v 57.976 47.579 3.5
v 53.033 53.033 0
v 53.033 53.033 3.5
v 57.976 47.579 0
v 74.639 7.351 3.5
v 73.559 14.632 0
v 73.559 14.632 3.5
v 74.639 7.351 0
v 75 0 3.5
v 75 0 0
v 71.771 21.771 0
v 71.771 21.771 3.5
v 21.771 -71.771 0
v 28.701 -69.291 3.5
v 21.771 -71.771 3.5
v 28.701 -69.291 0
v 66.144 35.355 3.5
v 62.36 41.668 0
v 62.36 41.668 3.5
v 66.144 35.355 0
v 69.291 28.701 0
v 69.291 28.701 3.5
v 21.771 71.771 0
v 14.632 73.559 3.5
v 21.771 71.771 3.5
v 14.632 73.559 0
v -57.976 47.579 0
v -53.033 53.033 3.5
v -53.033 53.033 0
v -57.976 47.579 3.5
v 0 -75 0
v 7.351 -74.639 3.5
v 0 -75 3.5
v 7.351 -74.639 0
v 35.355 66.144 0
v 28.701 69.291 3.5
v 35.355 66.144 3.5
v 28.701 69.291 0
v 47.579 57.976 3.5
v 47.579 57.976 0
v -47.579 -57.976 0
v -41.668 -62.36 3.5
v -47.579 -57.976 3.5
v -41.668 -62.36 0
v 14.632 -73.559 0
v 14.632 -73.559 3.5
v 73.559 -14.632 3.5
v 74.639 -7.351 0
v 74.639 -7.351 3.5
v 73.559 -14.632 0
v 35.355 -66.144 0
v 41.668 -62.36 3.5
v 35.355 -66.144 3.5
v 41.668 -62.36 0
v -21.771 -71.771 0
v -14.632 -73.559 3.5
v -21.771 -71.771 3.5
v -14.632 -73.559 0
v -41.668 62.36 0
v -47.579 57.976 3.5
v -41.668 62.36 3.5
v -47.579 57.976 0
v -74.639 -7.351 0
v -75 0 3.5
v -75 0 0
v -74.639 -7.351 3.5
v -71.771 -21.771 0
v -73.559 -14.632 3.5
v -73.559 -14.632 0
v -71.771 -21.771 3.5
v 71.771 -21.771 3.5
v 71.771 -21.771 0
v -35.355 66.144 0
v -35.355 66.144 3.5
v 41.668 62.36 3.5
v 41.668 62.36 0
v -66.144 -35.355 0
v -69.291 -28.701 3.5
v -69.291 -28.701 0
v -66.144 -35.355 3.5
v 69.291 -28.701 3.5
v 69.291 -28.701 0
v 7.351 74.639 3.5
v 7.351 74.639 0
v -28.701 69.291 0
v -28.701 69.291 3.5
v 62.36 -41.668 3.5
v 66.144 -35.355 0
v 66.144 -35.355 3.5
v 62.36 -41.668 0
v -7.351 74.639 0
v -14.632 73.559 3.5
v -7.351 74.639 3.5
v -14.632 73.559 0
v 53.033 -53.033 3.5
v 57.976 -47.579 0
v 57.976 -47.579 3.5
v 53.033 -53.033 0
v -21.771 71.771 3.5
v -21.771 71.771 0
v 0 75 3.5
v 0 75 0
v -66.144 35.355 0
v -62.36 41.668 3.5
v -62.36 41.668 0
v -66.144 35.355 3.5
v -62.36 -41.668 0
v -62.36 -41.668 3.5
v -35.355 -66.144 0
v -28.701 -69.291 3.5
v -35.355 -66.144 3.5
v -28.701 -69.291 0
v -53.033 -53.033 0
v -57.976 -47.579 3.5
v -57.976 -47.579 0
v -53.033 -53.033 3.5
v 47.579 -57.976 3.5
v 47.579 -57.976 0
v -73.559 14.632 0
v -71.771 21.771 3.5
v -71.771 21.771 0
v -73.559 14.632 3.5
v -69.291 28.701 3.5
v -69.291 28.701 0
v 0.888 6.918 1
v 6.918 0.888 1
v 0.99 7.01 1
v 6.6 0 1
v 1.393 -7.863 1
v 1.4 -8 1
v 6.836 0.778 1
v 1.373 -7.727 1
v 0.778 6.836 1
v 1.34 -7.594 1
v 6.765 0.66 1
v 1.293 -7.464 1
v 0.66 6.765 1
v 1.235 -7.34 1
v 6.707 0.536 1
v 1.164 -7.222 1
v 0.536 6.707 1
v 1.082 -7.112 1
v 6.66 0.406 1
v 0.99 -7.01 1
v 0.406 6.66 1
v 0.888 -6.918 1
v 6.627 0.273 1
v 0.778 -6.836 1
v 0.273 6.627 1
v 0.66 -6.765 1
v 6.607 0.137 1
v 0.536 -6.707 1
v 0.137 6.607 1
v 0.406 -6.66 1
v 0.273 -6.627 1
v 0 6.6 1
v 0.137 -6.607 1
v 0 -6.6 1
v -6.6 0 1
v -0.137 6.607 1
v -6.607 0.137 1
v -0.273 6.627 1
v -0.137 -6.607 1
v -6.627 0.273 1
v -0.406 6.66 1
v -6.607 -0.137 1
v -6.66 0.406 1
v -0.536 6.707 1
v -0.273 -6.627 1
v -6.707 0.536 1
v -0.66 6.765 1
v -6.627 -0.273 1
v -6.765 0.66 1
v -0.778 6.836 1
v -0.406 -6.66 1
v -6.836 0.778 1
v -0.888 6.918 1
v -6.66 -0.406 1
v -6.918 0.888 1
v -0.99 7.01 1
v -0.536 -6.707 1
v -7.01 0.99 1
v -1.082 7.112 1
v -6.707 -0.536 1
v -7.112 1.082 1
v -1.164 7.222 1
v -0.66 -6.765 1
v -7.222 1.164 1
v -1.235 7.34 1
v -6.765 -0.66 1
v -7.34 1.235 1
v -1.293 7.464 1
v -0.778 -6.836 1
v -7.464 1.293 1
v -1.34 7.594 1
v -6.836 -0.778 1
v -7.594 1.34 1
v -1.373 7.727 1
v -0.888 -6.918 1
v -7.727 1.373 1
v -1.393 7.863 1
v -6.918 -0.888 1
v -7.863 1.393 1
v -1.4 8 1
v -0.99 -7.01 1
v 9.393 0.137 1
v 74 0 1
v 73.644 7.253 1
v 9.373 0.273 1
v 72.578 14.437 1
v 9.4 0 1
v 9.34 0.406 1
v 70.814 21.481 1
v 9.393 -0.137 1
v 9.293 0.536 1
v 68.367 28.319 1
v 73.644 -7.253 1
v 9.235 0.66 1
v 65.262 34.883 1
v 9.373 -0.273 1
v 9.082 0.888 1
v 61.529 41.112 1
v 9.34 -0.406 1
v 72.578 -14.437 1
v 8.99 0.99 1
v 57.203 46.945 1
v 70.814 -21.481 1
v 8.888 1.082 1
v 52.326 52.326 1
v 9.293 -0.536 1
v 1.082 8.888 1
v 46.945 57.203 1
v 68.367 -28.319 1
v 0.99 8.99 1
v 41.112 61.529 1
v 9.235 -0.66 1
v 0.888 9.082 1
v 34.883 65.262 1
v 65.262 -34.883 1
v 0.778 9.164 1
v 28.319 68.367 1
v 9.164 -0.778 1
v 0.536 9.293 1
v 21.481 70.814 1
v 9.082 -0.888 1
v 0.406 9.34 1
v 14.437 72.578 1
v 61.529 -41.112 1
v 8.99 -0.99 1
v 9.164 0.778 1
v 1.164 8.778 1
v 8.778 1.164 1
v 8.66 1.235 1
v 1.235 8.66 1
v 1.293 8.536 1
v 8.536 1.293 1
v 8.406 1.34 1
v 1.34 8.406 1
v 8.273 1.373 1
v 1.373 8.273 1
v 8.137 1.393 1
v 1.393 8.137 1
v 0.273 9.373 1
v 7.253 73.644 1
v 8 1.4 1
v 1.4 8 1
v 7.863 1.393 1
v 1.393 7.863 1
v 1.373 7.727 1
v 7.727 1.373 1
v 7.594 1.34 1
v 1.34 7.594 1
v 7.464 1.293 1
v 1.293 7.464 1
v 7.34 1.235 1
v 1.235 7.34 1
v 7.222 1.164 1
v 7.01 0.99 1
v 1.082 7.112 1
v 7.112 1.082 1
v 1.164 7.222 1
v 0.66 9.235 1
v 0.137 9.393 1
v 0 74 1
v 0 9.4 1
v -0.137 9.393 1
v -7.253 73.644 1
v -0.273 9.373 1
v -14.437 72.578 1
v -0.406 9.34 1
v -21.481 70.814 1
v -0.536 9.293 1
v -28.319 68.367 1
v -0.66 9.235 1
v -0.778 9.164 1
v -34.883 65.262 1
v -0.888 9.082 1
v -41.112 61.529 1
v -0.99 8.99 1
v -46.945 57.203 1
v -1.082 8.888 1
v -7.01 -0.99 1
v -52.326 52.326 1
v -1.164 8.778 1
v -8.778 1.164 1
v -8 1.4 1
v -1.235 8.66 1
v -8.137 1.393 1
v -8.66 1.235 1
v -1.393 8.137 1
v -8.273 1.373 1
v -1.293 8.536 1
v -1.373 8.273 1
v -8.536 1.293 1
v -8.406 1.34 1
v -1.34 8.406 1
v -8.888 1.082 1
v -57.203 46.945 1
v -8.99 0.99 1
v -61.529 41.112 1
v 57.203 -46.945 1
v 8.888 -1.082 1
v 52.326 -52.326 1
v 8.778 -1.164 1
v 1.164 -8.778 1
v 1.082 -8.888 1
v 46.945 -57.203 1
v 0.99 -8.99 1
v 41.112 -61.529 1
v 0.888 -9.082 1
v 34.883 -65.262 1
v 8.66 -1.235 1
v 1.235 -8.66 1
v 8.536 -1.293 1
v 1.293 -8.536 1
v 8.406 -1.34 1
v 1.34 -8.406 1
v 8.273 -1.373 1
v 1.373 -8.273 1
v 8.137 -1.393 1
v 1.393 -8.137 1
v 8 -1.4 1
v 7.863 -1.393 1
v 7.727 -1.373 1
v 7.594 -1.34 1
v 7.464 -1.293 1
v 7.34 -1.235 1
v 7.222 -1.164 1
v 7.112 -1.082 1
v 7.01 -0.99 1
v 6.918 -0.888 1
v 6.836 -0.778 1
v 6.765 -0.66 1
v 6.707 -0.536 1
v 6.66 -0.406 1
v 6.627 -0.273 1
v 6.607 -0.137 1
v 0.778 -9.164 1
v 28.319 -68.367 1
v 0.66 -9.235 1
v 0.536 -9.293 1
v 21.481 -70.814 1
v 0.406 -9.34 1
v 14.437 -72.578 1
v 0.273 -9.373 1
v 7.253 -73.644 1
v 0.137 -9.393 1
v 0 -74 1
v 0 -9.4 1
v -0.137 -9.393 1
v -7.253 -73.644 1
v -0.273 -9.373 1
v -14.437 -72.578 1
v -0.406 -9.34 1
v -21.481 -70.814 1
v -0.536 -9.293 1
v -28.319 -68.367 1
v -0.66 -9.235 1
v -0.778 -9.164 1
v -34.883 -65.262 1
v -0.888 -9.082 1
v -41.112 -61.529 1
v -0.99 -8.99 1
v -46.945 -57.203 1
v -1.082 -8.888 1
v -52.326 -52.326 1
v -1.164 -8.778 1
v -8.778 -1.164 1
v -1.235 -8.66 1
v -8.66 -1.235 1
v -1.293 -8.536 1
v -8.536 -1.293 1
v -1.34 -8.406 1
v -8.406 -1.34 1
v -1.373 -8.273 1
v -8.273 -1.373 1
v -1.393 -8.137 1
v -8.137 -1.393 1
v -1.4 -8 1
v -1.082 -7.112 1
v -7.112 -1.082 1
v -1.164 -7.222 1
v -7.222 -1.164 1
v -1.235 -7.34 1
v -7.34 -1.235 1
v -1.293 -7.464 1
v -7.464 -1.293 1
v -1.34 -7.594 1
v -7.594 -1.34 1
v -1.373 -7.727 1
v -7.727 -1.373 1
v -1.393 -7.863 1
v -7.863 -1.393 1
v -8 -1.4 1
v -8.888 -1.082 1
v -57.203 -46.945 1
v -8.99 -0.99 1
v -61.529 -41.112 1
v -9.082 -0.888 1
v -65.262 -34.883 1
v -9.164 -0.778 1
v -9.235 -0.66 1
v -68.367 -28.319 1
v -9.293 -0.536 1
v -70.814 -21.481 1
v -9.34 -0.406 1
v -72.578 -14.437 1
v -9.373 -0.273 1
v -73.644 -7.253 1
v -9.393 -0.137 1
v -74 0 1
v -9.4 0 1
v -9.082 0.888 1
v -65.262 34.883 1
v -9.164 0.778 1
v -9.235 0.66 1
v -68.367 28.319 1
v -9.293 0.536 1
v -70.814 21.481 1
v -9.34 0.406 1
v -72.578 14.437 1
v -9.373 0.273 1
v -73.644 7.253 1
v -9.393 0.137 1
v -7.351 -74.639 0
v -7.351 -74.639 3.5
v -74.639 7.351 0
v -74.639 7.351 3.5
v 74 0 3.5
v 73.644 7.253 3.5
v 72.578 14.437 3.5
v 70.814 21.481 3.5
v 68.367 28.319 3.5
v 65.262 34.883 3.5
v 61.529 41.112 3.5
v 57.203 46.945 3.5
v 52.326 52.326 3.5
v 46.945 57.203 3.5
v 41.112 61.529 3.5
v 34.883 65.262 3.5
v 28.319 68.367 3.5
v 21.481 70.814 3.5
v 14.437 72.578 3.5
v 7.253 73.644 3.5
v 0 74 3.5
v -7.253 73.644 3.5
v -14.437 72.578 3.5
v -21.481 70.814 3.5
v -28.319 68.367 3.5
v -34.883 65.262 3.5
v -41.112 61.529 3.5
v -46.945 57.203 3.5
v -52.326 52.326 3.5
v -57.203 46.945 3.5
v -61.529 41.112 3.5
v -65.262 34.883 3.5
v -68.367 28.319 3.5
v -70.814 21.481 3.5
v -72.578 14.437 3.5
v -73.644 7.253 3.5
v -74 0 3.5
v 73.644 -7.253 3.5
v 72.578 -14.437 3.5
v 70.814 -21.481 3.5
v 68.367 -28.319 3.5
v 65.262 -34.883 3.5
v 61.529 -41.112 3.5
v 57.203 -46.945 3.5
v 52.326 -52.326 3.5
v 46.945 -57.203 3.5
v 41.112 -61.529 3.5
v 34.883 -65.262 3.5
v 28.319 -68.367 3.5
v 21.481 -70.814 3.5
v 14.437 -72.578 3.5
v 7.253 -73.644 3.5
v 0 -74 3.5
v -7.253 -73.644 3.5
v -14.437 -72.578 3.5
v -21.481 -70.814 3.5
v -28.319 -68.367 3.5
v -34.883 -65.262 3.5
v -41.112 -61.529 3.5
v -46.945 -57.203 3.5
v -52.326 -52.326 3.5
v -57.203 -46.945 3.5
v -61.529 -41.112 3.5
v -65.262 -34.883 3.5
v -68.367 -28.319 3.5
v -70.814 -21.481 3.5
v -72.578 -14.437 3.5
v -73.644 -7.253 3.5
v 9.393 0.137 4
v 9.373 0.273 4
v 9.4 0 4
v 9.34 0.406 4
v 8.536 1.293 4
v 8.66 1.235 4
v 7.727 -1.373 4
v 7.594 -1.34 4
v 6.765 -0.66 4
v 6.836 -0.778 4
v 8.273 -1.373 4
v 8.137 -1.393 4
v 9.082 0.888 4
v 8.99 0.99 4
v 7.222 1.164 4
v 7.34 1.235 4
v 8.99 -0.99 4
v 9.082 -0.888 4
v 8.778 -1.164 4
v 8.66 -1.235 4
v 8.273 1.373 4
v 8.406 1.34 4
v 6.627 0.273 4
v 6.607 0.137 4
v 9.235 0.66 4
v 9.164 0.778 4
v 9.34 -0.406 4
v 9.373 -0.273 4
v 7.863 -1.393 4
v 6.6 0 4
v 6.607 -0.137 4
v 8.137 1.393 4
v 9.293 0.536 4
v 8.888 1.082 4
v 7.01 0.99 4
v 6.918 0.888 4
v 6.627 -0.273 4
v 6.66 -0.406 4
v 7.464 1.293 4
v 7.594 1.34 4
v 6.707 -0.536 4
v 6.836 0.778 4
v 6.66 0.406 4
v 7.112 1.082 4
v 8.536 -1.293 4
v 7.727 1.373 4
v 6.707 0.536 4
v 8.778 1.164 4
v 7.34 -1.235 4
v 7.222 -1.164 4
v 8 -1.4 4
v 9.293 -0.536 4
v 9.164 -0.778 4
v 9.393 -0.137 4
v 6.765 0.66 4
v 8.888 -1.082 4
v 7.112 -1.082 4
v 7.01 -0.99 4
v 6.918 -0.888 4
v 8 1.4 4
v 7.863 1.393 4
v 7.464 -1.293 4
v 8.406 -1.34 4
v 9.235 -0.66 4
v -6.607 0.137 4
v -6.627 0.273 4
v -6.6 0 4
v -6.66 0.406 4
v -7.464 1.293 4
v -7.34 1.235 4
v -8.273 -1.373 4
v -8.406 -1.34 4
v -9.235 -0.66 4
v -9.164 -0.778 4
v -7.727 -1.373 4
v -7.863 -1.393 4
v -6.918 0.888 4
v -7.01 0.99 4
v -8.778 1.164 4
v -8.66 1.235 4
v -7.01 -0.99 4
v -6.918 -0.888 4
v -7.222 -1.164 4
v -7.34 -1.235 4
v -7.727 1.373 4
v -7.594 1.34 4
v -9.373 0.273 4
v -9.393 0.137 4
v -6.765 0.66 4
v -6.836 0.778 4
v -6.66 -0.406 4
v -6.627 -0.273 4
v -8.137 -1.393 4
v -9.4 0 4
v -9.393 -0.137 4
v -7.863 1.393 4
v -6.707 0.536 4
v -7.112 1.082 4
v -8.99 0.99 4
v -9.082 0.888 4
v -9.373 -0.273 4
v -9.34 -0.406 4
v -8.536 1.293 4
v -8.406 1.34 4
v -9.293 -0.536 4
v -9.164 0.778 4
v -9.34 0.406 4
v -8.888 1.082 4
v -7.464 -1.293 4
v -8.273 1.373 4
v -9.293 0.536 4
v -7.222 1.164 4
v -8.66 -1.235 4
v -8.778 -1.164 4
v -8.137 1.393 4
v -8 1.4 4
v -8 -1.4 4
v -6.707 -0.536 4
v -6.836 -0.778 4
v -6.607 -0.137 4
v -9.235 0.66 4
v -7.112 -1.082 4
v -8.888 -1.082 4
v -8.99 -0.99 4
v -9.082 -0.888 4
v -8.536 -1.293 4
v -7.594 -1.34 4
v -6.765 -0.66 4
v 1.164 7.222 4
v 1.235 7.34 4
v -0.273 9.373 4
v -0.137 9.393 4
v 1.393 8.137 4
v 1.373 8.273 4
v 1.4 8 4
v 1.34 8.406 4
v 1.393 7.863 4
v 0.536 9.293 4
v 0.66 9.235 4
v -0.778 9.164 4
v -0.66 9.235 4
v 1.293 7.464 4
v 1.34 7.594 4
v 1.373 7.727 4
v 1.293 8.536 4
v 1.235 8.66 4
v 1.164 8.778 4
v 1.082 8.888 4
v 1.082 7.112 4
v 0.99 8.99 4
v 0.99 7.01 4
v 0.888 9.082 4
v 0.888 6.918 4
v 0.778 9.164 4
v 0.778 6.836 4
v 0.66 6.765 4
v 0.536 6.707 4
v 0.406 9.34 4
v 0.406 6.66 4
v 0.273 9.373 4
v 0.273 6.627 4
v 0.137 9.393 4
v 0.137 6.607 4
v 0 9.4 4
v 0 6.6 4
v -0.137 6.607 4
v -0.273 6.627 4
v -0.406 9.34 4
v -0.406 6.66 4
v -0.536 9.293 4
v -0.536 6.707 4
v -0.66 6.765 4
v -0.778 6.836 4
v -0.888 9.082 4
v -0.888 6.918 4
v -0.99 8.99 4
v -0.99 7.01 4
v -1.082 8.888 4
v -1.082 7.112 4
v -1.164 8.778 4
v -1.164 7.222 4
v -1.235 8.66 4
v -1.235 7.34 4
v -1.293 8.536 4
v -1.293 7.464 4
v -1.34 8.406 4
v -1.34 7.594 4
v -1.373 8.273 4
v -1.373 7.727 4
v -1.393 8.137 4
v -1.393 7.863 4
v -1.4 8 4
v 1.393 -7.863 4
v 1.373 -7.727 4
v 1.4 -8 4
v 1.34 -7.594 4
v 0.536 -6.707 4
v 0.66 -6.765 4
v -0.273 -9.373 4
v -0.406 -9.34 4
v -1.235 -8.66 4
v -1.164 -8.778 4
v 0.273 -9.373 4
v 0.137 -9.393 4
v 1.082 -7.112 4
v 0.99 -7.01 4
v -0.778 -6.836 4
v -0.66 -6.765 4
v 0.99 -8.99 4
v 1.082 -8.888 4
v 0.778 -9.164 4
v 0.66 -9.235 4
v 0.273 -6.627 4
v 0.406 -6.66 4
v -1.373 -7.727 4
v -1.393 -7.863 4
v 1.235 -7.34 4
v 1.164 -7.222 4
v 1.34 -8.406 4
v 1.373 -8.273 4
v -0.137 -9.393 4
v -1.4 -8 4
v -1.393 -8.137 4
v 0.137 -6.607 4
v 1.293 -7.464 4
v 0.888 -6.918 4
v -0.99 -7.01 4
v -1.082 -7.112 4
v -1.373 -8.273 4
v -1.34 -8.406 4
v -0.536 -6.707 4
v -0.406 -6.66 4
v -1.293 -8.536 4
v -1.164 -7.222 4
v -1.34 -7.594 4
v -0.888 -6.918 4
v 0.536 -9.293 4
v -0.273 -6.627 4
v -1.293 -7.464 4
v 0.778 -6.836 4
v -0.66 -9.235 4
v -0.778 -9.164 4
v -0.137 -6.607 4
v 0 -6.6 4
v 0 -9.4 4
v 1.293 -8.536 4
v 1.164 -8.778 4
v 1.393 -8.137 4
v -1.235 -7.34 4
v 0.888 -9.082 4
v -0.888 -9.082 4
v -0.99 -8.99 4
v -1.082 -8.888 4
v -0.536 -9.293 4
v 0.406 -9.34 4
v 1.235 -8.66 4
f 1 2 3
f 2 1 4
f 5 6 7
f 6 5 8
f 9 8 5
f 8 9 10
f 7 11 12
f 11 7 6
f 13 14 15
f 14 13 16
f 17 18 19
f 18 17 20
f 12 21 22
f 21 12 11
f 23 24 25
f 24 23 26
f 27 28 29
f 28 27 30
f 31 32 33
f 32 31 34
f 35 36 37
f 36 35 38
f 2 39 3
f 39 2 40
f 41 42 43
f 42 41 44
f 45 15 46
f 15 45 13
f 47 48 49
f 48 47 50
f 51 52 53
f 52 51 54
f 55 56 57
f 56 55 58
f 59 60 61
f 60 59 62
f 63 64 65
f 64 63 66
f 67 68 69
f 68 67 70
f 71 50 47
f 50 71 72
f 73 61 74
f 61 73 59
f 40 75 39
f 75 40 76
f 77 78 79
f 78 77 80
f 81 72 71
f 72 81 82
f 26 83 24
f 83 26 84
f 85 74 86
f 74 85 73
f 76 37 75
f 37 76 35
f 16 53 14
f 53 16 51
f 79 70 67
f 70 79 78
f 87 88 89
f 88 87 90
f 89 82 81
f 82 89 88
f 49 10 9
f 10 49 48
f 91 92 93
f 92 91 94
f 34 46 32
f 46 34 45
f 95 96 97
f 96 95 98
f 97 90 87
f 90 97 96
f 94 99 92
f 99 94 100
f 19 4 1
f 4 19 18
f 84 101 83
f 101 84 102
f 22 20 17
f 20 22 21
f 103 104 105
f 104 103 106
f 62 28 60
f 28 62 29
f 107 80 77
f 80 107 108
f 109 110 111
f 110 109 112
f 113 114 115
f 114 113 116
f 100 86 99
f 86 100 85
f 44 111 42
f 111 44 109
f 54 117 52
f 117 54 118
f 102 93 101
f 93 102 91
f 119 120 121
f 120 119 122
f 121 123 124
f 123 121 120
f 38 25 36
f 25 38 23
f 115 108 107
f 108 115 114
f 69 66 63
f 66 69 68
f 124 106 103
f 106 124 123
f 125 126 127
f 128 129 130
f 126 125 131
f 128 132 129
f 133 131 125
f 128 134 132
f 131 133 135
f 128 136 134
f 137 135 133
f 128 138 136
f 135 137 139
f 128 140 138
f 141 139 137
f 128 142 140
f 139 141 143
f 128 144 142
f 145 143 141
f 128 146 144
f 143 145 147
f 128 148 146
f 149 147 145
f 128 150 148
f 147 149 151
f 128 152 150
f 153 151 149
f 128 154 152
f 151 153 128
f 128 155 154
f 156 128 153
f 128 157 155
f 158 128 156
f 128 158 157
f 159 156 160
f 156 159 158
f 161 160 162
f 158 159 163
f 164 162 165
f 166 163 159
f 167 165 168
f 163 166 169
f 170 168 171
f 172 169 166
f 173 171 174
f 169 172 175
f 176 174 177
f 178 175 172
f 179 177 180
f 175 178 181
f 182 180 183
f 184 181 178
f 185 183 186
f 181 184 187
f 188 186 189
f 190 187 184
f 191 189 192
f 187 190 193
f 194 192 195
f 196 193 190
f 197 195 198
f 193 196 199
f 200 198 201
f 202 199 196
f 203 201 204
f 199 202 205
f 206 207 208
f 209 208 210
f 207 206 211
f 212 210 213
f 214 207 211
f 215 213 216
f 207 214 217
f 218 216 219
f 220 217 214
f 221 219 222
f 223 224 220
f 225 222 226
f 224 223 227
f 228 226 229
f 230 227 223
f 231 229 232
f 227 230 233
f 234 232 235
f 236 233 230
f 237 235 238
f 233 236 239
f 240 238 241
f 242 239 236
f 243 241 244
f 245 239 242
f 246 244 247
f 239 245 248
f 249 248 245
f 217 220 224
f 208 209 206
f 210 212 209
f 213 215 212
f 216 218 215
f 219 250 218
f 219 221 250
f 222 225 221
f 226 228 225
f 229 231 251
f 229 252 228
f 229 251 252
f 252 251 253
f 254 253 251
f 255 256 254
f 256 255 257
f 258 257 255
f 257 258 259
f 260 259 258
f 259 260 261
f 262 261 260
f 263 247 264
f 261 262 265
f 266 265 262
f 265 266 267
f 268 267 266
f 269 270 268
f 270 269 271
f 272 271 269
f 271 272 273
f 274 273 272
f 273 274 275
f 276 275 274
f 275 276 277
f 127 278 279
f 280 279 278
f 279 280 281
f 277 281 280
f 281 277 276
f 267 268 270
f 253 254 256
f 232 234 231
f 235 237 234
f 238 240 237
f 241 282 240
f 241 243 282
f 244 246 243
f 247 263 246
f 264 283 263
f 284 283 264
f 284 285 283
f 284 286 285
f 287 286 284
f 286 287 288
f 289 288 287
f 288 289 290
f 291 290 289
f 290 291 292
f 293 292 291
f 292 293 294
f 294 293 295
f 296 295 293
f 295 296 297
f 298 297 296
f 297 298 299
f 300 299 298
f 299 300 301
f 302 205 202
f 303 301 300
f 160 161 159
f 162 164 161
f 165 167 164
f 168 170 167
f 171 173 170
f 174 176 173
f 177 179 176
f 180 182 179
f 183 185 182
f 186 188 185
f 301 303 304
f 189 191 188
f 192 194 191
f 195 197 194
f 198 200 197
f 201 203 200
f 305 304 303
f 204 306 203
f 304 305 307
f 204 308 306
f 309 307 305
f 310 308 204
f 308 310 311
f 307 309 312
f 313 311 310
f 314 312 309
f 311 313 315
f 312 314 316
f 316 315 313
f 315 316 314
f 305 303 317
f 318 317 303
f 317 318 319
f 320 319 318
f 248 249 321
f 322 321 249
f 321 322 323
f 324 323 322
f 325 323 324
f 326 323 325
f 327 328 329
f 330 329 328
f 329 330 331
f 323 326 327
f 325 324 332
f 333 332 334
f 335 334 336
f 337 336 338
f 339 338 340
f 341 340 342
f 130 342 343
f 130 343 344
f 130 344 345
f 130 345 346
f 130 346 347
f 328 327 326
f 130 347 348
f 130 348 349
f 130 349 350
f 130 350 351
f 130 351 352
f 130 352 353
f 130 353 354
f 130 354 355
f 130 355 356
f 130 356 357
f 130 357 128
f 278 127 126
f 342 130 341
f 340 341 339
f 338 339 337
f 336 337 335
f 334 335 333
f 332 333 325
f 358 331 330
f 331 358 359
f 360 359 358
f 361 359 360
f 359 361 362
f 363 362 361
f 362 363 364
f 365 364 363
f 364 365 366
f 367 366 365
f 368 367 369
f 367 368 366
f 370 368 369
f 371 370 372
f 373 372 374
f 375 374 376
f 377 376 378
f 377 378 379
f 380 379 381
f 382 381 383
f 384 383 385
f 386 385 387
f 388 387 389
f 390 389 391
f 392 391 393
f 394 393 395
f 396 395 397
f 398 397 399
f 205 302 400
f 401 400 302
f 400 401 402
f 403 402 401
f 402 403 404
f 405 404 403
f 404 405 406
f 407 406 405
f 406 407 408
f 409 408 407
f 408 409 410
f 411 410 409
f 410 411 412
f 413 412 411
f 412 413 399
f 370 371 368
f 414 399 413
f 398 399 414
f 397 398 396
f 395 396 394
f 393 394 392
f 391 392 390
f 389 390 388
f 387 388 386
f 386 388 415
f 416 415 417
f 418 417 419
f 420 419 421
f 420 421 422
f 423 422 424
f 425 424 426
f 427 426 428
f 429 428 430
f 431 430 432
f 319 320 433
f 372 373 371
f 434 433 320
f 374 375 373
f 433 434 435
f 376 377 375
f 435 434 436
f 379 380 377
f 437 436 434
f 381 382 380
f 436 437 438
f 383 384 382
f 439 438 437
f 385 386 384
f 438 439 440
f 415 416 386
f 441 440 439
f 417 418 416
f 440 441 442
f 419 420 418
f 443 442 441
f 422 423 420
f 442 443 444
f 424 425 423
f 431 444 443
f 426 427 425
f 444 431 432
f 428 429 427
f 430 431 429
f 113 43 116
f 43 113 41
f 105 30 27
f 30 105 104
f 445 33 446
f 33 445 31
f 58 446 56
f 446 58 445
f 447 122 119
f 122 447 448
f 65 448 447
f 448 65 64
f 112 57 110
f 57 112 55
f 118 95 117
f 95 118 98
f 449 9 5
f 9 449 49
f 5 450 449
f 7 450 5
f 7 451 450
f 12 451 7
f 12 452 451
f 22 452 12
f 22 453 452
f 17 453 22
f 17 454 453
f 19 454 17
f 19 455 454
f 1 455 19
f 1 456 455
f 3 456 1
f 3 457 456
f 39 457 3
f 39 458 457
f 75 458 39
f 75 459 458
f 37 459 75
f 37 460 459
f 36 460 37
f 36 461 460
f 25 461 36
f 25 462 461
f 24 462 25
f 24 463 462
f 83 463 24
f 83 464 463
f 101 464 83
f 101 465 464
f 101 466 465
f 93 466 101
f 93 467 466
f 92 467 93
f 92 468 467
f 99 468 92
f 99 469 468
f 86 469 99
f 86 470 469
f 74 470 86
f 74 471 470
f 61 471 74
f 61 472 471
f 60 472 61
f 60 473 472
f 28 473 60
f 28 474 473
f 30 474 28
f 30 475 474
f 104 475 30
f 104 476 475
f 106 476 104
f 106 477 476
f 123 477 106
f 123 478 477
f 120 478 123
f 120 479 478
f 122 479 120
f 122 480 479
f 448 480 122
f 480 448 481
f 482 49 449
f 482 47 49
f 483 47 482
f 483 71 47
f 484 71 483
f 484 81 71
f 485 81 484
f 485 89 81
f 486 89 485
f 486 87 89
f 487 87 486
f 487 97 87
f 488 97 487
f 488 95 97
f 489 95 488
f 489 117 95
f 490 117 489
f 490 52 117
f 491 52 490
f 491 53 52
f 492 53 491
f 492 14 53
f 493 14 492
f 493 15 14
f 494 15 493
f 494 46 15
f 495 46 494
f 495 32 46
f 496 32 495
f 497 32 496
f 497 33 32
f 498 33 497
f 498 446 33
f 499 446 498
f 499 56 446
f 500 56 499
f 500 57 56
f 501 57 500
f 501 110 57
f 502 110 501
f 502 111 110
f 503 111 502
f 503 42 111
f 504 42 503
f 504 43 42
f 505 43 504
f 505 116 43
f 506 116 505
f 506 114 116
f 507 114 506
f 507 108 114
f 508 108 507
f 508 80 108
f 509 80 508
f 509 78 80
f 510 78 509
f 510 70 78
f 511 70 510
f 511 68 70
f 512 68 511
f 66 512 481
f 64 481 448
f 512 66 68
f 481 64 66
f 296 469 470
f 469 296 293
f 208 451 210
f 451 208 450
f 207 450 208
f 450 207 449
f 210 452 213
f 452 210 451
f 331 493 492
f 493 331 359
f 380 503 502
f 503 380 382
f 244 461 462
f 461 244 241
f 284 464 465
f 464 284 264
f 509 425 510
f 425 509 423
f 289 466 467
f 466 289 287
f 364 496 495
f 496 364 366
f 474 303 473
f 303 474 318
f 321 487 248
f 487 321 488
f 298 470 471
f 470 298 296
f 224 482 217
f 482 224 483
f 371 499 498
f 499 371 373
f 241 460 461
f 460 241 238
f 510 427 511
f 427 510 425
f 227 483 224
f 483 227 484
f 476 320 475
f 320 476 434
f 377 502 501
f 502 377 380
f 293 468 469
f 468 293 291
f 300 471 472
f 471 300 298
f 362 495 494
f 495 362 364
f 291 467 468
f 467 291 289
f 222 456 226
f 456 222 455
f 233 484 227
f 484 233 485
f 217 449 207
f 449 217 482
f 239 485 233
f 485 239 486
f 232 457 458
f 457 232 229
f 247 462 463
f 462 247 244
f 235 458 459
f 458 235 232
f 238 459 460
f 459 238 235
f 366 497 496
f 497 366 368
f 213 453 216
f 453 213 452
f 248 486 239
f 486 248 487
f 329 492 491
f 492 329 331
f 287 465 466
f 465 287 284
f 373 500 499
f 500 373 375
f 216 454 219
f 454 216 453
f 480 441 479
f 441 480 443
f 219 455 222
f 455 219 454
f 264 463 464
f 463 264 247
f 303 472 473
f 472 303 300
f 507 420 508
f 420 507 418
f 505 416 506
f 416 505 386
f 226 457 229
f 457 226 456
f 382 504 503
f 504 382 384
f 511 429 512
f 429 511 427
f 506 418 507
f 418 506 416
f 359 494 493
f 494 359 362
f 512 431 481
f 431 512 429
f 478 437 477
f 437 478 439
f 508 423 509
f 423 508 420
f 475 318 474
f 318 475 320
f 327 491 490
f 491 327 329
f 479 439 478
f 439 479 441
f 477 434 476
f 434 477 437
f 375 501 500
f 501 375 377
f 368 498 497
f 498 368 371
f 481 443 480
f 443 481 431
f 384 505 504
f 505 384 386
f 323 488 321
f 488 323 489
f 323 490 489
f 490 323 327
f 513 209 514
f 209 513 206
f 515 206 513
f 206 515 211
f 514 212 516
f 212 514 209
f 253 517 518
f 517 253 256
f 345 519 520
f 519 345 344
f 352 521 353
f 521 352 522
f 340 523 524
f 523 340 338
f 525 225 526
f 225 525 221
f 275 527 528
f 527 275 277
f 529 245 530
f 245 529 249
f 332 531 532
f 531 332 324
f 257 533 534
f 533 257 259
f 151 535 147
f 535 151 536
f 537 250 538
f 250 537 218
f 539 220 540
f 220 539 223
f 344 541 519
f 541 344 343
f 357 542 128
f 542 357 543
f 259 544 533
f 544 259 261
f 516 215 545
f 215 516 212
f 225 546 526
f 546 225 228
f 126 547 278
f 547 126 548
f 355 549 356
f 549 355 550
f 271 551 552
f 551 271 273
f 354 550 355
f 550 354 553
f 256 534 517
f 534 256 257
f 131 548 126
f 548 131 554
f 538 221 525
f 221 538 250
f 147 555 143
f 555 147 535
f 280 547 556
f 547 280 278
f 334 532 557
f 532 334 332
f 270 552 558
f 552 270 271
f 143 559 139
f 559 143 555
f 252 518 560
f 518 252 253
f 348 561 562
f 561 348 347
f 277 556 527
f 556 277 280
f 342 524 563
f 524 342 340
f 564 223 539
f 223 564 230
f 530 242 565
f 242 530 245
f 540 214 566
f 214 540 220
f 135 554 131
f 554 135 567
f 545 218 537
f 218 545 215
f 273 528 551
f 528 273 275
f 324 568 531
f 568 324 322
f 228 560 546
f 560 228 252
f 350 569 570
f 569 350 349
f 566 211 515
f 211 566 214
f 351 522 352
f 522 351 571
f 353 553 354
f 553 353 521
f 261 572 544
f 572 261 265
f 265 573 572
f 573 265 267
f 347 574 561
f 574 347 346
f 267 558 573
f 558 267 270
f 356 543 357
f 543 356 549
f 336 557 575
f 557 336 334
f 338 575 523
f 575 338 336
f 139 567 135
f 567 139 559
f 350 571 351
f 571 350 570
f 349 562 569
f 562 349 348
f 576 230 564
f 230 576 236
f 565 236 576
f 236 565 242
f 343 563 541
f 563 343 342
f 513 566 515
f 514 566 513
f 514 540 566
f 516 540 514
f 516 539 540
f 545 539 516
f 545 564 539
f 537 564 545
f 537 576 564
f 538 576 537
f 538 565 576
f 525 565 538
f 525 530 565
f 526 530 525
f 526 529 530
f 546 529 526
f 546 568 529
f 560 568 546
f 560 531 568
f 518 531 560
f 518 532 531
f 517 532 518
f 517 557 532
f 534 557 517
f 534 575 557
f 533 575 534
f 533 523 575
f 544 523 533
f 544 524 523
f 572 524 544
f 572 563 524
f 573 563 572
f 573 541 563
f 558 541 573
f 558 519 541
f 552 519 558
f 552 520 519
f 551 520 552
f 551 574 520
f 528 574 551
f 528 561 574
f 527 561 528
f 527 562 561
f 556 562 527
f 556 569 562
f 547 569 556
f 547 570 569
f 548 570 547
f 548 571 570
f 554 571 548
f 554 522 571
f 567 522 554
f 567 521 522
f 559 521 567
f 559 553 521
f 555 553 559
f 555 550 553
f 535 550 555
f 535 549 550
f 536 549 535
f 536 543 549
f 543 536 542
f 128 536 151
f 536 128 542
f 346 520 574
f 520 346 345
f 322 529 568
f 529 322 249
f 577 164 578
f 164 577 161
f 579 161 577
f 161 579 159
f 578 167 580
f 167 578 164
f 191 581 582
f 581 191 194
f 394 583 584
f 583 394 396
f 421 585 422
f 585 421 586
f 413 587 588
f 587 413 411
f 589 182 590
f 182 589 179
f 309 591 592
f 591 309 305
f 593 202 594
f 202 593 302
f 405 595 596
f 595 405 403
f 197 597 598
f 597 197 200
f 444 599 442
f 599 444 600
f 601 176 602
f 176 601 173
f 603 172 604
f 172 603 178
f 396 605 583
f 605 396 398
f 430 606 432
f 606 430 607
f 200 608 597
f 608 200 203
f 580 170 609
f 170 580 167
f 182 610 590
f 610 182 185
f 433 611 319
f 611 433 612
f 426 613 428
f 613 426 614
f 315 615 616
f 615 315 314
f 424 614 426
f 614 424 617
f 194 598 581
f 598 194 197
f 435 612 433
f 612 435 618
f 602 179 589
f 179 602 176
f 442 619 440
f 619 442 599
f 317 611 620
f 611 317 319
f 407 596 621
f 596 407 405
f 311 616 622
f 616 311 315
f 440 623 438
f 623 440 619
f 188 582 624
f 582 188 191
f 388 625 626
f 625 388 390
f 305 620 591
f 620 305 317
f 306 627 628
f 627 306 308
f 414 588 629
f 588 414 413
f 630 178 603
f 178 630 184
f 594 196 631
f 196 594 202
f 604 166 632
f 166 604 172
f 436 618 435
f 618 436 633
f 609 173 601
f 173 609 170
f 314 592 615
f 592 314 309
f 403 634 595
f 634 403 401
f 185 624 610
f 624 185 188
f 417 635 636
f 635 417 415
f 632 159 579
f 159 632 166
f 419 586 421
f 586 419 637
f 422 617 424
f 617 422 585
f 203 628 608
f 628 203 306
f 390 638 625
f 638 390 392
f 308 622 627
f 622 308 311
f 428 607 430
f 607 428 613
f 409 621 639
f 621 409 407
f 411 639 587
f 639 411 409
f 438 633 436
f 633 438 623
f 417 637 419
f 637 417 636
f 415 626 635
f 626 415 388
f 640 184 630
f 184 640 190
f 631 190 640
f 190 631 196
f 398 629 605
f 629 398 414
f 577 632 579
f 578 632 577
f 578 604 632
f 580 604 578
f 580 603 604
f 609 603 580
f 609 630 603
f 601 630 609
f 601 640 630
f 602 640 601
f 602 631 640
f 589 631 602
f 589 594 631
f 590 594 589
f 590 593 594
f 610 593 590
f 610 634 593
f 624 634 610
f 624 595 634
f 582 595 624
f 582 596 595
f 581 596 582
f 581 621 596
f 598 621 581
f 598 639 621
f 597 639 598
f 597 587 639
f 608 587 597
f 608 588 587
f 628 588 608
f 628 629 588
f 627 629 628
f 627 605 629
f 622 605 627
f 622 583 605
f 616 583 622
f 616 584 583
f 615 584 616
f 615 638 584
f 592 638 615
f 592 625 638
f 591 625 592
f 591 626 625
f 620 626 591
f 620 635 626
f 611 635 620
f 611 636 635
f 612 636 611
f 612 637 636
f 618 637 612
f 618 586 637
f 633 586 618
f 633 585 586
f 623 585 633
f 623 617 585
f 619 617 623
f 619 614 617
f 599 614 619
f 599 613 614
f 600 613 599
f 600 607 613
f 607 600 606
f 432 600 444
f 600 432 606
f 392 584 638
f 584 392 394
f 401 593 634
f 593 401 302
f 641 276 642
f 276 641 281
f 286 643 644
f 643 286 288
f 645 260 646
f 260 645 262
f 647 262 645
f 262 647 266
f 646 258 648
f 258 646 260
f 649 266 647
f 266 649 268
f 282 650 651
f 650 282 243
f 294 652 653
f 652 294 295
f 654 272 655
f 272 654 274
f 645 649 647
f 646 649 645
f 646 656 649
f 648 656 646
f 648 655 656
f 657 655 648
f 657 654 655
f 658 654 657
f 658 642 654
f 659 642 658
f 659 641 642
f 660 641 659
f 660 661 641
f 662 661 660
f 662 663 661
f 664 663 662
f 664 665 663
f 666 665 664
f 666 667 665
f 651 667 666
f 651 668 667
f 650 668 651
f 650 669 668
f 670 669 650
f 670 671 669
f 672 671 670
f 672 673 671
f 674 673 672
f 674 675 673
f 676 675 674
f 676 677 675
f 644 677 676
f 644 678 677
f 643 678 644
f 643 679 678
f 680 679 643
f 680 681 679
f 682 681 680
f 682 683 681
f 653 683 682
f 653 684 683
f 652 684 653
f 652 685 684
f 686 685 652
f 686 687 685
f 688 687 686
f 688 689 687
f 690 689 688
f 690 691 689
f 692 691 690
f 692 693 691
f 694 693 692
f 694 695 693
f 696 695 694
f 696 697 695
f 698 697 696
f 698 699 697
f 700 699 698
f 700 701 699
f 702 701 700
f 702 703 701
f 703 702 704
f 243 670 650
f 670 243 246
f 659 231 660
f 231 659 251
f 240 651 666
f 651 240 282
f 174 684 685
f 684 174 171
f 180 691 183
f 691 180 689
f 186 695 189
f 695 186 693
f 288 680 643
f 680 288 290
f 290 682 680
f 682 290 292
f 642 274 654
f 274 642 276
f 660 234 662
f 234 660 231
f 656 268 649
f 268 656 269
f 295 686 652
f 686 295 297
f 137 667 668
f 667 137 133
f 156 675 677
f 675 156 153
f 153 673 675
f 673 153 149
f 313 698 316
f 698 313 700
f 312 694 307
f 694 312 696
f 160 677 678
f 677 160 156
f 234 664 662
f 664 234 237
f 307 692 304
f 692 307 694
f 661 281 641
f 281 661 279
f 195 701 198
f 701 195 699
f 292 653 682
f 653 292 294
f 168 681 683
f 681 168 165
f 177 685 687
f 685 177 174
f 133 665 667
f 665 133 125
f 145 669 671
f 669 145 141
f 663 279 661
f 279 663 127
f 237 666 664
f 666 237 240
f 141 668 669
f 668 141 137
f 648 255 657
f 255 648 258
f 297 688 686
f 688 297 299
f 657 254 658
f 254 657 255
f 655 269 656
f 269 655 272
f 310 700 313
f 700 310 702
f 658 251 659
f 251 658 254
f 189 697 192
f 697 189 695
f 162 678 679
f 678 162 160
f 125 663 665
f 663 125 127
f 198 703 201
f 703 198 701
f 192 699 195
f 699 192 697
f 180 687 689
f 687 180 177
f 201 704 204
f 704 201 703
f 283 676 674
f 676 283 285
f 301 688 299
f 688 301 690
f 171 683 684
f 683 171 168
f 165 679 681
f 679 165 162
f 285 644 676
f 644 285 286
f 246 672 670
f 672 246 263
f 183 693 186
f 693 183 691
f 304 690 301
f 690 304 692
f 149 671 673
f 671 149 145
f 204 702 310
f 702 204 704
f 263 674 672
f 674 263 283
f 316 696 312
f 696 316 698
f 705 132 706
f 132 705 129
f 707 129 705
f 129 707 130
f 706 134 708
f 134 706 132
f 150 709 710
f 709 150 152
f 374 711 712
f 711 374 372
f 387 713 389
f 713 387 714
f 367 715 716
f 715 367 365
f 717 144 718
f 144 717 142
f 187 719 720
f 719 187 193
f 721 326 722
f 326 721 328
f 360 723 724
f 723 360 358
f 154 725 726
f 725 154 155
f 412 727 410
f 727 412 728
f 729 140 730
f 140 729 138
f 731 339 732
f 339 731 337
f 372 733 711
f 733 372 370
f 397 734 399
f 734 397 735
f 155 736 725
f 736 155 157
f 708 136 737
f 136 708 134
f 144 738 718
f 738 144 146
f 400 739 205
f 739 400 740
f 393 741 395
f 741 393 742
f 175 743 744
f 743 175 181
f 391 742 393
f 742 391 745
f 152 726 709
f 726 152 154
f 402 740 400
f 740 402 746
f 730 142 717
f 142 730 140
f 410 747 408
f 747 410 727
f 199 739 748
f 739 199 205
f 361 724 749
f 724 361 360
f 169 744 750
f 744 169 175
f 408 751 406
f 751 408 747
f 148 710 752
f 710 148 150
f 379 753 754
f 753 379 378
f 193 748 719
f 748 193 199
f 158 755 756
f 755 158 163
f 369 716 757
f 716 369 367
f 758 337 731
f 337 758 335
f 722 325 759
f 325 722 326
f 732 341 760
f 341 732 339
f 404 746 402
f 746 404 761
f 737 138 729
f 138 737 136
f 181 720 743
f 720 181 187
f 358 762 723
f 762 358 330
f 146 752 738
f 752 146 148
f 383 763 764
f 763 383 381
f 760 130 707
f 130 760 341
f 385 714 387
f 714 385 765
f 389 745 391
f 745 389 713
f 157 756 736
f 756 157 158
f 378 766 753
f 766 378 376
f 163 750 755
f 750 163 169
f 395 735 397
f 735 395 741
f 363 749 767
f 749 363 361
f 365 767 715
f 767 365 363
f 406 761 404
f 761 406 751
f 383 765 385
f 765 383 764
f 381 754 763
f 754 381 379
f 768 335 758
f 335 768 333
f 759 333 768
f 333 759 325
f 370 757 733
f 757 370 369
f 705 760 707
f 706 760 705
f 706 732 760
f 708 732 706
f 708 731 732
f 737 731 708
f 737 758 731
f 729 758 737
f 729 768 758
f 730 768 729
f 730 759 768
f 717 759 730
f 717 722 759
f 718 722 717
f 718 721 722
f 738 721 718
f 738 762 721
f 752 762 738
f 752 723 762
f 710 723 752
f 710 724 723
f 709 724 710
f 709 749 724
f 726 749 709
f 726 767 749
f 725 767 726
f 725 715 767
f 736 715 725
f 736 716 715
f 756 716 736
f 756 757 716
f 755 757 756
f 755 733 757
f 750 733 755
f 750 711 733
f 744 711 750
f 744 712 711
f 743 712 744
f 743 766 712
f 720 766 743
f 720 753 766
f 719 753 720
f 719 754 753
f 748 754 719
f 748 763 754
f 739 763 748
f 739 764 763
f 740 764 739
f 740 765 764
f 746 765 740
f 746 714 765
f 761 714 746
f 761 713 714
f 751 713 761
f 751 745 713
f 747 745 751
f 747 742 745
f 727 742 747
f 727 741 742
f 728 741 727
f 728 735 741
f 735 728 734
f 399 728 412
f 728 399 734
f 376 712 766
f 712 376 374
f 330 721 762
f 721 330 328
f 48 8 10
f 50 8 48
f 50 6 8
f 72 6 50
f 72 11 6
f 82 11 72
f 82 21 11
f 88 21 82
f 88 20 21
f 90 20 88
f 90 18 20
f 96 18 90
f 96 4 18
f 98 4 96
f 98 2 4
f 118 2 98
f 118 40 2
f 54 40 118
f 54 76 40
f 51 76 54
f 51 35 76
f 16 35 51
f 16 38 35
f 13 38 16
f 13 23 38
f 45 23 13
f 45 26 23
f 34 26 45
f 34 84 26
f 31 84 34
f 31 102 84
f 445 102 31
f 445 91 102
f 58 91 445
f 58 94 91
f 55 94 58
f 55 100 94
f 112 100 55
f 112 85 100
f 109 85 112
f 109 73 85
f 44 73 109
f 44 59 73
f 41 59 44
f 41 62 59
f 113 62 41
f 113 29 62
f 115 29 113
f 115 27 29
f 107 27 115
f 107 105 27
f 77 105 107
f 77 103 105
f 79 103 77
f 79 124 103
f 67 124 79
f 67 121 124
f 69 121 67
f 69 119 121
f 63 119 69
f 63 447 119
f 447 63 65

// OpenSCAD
module render()
{
  outer_radius = 150.0 / 2.0;
  outer_height = 2.5;
  dimple_radius = 1.4;
  dimple_offset = 8;
  dimple_height = 3;
  fn = 64;

  union() {
    cylinder(h = 1,
             r1 = outer_radius,
             r2 = outer_radius, $fn=fn);
    translate([0, 0, 1])
    difference() {
      cylinder(h = outer_height,
               r1 = outer_radius,
               r2 = outer_radius, $fn=fn);
      cylinder(h = outer_height,
               r1 = outer_radius-1,
               r2 = outer_radius-1, $fn=fn);
    }
    for (p = [[dimple_offset , 0],
              [-dimple_offset , 0],
              [0, dimple_offset],
              [0, -dimple_offset]]) {
      translate([p[0], p[1],
                1])
      cylinder(h = dimple_height,
               r1 = dimple_radius,
               r2 = dimple_radius, $fn=fn);
    }
  }
}

echo(version=version());

render();
